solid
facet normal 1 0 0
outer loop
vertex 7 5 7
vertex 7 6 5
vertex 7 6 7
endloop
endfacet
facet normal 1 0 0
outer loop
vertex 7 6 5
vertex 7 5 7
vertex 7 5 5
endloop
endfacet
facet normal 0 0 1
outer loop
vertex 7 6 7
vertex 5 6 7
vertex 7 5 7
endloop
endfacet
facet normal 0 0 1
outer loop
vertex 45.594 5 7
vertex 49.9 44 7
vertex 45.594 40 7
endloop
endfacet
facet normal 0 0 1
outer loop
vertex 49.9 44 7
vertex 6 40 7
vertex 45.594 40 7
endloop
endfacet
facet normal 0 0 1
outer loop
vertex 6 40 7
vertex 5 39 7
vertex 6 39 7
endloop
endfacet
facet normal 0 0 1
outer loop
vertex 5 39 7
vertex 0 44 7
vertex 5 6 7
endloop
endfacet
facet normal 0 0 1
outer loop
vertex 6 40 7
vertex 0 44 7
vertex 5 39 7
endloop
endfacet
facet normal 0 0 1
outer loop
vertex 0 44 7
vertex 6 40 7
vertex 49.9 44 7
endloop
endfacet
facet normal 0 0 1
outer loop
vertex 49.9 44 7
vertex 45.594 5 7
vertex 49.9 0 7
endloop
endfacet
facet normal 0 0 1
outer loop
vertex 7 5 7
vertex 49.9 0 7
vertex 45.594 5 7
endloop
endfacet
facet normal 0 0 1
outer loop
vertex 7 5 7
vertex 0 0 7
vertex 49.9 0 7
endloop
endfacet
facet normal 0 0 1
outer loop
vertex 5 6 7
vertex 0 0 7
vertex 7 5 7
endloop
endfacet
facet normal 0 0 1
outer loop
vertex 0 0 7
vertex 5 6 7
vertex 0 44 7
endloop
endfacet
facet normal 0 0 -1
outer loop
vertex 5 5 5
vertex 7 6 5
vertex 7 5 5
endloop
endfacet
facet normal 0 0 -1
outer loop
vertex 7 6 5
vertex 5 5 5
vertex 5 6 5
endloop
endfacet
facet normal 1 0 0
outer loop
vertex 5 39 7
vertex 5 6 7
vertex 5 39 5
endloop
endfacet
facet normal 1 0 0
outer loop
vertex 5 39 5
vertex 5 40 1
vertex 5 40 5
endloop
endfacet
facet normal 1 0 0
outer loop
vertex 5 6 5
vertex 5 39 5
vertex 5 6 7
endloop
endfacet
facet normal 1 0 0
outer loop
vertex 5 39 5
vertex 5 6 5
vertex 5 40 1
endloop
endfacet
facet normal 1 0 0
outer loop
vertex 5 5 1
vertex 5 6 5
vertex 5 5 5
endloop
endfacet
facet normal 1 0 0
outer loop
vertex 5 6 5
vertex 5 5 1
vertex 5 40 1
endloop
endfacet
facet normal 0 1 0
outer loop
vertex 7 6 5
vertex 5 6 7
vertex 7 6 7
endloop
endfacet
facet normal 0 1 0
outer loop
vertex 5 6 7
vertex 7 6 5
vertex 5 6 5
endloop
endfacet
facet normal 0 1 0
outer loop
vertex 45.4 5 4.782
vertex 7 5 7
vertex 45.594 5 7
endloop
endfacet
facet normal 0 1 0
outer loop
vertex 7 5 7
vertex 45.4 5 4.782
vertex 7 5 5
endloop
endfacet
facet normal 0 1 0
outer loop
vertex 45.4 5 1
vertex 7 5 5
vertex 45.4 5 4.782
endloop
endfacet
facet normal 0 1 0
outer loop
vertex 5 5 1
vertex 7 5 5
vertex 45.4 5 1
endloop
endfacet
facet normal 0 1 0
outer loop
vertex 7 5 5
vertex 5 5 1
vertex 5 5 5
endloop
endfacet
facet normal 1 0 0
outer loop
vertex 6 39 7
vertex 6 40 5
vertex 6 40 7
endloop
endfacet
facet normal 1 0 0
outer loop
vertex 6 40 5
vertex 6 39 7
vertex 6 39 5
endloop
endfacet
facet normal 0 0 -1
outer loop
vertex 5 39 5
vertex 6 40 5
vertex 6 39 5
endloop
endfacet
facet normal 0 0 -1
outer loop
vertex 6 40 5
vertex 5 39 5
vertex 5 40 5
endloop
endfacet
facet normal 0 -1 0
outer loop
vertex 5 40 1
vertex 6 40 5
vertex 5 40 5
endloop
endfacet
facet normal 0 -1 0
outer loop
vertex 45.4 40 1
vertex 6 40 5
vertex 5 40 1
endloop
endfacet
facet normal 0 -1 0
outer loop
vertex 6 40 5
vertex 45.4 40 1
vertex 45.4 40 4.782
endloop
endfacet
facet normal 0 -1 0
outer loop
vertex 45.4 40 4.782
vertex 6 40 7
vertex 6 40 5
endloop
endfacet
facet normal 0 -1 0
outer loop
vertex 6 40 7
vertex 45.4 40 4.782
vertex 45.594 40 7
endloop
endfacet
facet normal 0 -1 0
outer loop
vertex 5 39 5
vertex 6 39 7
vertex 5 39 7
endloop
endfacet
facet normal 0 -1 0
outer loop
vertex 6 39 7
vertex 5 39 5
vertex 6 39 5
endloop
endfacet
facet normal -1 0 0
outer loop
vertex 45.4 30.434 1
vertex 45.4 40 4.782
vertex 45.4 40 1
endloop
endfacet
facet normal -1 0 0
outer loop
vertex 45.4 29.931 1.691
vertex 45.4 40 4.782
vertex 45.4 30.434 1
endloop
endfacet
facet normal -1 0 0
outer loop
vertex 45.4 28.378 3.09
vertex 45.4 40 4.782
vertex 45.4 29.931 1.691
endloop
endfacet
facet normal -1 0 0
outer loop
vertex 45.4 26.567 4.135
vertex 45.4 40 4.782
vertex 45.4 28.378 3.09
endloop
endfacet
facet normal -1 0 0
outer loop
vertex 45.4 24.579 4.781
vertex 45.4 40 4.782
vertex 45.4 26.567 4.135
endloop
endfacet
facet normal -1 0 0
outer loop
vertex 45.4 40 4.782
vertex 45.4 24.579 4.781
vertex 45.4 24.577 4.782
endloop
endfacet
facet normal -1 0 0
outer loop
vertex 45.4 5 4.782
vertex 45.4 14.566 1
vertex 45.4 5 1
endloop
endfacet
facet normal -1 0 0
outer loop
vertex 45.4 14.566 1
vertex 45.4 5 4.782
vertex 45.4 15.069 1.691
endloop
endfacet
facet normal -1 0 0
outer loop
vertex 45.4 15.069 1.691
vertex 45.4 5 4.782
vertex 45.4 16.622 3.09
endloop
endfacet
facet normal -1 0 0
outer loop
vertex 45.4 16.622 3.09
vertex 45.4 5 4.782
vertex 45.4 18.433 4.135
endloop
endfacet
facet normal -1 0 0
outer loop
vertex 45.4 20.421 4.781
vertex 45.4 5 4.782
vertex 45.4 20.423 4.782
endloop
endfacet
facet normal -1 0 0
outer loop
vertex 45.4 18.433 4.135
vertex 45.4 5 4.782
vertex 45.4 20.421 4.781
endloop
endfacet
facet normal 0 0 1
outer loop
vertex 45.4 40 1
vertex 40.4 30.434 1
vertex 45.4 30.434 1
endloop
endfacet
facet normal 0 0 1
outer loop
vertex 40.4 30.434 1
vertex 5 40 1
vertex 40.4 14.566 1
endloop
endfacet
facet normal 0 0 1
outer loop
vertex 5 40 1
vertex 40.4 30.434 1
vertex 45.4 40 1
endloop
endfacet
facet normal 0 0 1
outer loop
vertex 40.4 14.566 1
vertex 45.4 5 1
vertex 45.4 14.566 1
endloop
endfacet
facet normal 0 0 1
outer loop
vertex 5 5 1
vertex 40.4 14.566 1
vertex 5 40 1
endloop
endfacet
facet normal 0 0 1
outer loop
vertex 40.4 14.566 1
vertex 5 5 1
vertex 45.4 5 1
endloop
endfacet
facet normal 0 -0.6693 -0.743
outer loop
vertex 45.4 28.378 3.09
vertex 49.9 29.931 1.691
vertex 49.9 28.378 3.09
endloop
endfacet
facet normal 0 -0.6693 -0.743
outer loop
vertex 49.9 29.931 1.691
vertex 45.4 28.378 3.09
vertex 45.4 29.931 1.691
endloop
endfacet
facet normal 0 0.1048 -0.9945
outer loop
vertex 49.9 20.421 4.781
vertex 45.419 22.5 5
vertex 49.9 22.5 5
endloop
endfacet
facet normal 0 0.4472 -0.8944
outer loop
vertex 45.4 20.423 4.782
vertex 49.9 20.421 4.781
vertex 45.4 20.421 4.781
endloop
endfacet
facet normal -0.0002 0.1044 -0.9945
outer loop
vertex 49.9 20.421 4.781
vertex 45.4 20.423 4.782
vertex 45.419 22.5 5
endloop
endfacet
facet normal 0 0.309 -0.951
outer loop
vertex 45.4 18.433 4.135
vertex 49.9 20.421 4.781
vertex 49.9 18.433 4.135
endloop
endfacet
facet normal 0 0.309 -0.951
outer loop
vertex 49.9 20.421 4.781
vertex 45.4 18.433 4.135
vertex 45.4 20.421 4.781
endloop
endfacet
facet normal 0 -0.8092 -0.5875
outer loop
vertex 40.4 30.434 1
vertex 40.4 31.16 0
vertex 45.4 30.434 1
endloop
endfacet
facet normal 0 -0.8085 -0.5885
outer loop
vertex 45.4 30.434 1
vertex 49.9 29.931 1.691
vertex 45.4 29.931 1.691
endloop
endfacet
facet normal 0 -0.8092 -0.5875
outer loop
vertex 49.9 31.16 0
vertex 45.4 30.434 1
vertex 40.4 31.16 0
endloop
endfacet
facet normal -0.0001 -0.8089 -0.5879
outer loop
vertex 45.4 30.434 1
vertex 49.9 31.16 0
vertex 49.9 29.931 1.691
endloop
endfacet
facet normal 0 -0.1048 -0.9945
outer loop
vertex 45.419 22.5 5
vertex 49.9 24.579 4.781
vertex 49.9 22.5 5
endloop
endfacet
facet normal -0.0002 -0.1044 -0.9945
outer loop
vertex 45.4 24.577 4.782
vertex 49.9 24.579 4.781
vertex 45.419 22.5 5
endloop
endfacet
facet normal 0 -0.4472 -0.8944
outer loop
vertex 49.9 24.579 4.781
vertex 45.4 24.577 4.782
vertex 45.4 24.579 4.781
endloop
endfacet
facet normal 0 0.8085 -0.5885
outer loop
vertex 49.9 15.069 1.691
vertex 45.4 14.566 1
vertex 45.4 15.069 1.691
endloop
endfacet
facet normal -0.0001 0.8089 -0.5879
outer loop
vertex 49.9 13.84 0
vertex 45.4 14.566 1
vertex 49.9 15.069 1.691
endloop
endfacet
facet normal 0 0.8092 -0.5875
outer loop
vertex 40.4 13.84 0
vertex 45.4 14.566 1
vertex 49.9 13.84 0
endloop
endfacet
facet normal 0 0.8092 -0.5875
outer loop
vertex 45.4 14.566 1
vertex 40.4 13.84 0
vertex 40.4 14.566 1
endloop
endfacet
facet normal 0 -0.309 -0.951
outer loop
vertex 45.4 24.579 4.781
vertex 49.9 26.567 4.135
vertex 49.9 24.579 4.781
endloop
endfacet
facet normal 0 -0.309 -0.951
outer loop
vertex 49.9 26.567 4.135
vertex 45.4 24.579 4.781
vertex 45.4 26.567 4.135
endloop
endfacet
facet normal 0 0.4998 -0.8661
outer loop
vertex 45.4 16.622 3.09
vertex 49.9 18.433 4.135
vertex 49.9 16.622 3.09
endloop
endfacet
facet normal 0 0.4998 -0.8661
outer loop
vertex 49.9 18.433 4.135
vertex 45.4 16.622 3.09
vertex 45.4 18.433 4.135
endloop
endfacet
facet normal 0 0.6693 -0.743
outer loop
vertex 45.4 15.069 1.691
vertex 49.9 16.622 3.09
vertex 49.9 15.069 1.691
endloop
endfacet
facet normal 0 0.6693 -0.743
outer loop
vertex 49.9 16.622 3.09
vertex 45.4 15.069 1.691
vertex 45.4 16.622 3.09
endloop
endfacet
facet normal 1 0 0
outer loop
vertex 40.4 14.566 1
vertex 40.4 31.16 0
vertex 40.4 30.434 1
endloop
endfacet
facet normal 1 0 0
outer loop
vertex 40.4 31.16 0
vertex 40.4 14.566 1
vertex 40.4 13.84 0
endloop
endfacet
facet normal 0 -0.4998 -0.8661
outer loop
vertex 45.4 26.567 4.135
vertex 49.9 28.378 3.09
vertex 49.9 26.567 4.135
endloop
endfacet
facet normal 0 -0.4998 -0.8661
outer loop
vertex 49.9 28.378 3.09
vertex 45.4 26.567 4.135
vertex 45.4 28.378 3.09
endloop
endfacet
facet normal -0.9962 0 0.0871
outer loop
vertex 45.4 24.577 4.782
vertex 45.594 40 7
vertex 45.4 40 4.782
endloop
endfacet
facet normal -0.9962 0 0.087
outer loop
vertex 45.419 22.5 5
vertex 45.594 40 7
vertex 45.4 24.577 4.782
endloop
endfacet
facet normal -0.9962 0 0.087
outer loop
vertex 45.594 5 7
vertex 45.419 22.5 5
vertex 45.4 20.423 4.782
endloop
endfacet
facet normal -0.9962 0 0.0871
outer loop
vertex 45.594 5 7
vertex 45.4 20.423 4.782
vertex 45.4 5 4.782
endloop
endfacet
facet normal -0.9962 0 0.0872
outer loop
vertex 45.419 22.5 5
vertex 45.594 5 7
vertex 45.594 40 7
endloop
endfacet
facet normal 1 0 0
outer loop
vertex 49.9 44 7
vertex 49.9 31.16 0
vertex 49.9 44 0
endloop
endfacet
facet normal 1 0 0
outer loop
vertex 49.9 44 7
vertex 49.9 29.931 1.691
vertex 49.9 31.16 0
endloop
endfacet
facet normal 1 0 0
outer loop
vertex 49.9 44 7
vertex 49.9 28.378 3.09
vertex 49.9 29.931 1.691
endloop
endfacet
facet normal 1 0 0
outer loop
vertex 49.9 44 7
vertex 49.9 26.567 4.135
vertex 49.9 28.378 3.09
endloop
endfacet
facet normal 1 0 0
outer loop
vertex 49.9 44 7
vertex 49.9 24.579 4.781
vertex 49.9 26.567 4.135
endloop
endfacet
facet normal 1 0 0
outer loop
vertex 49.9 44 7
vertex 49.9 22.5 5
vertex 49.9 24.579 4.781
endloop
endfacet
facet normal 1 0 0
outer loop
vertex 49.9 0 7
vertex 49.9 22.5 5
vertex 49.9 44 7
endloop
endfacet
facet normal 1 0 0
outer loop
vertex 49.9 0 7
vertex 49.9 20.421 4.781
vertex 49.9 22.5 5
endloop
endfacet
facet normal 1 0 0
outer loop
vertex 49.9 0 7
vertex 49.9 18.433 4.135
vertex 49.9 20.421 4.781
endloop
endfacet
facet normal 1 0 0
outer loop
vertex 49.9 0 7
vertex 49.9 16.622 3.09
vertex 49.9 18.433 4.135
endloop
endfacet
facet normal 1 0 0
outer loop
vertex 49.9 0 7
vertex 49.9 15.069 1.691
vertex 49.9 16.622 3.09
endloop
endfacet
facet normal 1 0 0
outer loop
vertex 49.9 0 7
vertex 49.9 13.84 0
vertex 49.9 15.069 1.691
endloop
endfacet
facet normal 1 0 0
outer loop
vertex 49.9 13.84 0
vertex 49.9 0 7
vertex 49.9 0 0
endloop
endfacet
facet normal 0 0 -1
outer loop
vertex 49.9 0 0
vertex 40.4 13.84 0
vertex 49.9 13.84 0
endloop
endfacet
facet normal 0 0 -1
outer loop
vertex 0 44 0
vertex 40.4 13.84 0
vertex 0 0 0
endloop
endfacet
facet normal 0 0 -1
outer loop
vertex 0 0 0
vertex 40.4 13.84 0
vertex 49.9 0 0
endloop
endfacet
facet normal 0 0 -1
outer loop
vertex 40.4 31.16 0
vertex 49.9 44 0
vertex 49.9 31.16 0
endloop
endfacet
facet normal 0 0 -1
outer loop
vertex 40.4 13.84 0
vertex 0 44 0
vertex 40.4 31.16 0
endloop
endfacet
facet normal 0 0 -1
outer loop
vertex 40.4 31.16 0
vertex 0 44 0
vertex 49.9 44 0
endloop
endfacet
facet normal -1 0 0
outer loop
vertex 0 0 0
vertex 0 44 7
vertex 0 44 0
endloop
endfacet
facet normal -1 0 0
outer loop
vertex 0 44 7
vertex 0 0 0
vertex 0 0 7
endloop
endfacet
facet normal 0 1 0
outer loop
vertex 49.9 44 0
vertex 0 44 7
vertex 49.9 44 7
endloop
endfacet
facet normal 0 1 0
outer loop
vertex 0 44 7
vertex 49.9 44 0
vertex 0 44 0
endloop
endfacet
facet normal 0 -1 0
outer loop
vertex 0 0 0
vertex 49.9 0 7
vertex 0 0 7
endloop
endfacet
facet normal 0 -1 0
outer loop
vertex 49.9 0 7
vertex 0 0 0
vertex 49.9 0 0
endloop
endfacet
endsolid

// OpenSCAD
//          VARIABLES
x=40.4; // Length 40.4
y=35;   // Width 35
z=6;    // Heigth 6
//
difference(){
    cube([x+9.5,y+9,z+1]);
    translate([5,5,1]){
        union(){
            difference(){
                cube([x,y,z]);
                union(){
                    translate([0,0,z-2]){
                        cube([2,1,2]);
                    }
                    translate([0,y-1,z-2]){
                        cube([1,1,2]);
                    }
                }
            }
            translate([x-5,y/2,-6]){
                rotate([0,90,0]){
                    cylinder(10,10,10);
                }
            }
            translate([x-5,0,z-2]){
                rotate([0,5,0]){
                    cube([5,y,5]);
                }
            }
        }
    }
}
